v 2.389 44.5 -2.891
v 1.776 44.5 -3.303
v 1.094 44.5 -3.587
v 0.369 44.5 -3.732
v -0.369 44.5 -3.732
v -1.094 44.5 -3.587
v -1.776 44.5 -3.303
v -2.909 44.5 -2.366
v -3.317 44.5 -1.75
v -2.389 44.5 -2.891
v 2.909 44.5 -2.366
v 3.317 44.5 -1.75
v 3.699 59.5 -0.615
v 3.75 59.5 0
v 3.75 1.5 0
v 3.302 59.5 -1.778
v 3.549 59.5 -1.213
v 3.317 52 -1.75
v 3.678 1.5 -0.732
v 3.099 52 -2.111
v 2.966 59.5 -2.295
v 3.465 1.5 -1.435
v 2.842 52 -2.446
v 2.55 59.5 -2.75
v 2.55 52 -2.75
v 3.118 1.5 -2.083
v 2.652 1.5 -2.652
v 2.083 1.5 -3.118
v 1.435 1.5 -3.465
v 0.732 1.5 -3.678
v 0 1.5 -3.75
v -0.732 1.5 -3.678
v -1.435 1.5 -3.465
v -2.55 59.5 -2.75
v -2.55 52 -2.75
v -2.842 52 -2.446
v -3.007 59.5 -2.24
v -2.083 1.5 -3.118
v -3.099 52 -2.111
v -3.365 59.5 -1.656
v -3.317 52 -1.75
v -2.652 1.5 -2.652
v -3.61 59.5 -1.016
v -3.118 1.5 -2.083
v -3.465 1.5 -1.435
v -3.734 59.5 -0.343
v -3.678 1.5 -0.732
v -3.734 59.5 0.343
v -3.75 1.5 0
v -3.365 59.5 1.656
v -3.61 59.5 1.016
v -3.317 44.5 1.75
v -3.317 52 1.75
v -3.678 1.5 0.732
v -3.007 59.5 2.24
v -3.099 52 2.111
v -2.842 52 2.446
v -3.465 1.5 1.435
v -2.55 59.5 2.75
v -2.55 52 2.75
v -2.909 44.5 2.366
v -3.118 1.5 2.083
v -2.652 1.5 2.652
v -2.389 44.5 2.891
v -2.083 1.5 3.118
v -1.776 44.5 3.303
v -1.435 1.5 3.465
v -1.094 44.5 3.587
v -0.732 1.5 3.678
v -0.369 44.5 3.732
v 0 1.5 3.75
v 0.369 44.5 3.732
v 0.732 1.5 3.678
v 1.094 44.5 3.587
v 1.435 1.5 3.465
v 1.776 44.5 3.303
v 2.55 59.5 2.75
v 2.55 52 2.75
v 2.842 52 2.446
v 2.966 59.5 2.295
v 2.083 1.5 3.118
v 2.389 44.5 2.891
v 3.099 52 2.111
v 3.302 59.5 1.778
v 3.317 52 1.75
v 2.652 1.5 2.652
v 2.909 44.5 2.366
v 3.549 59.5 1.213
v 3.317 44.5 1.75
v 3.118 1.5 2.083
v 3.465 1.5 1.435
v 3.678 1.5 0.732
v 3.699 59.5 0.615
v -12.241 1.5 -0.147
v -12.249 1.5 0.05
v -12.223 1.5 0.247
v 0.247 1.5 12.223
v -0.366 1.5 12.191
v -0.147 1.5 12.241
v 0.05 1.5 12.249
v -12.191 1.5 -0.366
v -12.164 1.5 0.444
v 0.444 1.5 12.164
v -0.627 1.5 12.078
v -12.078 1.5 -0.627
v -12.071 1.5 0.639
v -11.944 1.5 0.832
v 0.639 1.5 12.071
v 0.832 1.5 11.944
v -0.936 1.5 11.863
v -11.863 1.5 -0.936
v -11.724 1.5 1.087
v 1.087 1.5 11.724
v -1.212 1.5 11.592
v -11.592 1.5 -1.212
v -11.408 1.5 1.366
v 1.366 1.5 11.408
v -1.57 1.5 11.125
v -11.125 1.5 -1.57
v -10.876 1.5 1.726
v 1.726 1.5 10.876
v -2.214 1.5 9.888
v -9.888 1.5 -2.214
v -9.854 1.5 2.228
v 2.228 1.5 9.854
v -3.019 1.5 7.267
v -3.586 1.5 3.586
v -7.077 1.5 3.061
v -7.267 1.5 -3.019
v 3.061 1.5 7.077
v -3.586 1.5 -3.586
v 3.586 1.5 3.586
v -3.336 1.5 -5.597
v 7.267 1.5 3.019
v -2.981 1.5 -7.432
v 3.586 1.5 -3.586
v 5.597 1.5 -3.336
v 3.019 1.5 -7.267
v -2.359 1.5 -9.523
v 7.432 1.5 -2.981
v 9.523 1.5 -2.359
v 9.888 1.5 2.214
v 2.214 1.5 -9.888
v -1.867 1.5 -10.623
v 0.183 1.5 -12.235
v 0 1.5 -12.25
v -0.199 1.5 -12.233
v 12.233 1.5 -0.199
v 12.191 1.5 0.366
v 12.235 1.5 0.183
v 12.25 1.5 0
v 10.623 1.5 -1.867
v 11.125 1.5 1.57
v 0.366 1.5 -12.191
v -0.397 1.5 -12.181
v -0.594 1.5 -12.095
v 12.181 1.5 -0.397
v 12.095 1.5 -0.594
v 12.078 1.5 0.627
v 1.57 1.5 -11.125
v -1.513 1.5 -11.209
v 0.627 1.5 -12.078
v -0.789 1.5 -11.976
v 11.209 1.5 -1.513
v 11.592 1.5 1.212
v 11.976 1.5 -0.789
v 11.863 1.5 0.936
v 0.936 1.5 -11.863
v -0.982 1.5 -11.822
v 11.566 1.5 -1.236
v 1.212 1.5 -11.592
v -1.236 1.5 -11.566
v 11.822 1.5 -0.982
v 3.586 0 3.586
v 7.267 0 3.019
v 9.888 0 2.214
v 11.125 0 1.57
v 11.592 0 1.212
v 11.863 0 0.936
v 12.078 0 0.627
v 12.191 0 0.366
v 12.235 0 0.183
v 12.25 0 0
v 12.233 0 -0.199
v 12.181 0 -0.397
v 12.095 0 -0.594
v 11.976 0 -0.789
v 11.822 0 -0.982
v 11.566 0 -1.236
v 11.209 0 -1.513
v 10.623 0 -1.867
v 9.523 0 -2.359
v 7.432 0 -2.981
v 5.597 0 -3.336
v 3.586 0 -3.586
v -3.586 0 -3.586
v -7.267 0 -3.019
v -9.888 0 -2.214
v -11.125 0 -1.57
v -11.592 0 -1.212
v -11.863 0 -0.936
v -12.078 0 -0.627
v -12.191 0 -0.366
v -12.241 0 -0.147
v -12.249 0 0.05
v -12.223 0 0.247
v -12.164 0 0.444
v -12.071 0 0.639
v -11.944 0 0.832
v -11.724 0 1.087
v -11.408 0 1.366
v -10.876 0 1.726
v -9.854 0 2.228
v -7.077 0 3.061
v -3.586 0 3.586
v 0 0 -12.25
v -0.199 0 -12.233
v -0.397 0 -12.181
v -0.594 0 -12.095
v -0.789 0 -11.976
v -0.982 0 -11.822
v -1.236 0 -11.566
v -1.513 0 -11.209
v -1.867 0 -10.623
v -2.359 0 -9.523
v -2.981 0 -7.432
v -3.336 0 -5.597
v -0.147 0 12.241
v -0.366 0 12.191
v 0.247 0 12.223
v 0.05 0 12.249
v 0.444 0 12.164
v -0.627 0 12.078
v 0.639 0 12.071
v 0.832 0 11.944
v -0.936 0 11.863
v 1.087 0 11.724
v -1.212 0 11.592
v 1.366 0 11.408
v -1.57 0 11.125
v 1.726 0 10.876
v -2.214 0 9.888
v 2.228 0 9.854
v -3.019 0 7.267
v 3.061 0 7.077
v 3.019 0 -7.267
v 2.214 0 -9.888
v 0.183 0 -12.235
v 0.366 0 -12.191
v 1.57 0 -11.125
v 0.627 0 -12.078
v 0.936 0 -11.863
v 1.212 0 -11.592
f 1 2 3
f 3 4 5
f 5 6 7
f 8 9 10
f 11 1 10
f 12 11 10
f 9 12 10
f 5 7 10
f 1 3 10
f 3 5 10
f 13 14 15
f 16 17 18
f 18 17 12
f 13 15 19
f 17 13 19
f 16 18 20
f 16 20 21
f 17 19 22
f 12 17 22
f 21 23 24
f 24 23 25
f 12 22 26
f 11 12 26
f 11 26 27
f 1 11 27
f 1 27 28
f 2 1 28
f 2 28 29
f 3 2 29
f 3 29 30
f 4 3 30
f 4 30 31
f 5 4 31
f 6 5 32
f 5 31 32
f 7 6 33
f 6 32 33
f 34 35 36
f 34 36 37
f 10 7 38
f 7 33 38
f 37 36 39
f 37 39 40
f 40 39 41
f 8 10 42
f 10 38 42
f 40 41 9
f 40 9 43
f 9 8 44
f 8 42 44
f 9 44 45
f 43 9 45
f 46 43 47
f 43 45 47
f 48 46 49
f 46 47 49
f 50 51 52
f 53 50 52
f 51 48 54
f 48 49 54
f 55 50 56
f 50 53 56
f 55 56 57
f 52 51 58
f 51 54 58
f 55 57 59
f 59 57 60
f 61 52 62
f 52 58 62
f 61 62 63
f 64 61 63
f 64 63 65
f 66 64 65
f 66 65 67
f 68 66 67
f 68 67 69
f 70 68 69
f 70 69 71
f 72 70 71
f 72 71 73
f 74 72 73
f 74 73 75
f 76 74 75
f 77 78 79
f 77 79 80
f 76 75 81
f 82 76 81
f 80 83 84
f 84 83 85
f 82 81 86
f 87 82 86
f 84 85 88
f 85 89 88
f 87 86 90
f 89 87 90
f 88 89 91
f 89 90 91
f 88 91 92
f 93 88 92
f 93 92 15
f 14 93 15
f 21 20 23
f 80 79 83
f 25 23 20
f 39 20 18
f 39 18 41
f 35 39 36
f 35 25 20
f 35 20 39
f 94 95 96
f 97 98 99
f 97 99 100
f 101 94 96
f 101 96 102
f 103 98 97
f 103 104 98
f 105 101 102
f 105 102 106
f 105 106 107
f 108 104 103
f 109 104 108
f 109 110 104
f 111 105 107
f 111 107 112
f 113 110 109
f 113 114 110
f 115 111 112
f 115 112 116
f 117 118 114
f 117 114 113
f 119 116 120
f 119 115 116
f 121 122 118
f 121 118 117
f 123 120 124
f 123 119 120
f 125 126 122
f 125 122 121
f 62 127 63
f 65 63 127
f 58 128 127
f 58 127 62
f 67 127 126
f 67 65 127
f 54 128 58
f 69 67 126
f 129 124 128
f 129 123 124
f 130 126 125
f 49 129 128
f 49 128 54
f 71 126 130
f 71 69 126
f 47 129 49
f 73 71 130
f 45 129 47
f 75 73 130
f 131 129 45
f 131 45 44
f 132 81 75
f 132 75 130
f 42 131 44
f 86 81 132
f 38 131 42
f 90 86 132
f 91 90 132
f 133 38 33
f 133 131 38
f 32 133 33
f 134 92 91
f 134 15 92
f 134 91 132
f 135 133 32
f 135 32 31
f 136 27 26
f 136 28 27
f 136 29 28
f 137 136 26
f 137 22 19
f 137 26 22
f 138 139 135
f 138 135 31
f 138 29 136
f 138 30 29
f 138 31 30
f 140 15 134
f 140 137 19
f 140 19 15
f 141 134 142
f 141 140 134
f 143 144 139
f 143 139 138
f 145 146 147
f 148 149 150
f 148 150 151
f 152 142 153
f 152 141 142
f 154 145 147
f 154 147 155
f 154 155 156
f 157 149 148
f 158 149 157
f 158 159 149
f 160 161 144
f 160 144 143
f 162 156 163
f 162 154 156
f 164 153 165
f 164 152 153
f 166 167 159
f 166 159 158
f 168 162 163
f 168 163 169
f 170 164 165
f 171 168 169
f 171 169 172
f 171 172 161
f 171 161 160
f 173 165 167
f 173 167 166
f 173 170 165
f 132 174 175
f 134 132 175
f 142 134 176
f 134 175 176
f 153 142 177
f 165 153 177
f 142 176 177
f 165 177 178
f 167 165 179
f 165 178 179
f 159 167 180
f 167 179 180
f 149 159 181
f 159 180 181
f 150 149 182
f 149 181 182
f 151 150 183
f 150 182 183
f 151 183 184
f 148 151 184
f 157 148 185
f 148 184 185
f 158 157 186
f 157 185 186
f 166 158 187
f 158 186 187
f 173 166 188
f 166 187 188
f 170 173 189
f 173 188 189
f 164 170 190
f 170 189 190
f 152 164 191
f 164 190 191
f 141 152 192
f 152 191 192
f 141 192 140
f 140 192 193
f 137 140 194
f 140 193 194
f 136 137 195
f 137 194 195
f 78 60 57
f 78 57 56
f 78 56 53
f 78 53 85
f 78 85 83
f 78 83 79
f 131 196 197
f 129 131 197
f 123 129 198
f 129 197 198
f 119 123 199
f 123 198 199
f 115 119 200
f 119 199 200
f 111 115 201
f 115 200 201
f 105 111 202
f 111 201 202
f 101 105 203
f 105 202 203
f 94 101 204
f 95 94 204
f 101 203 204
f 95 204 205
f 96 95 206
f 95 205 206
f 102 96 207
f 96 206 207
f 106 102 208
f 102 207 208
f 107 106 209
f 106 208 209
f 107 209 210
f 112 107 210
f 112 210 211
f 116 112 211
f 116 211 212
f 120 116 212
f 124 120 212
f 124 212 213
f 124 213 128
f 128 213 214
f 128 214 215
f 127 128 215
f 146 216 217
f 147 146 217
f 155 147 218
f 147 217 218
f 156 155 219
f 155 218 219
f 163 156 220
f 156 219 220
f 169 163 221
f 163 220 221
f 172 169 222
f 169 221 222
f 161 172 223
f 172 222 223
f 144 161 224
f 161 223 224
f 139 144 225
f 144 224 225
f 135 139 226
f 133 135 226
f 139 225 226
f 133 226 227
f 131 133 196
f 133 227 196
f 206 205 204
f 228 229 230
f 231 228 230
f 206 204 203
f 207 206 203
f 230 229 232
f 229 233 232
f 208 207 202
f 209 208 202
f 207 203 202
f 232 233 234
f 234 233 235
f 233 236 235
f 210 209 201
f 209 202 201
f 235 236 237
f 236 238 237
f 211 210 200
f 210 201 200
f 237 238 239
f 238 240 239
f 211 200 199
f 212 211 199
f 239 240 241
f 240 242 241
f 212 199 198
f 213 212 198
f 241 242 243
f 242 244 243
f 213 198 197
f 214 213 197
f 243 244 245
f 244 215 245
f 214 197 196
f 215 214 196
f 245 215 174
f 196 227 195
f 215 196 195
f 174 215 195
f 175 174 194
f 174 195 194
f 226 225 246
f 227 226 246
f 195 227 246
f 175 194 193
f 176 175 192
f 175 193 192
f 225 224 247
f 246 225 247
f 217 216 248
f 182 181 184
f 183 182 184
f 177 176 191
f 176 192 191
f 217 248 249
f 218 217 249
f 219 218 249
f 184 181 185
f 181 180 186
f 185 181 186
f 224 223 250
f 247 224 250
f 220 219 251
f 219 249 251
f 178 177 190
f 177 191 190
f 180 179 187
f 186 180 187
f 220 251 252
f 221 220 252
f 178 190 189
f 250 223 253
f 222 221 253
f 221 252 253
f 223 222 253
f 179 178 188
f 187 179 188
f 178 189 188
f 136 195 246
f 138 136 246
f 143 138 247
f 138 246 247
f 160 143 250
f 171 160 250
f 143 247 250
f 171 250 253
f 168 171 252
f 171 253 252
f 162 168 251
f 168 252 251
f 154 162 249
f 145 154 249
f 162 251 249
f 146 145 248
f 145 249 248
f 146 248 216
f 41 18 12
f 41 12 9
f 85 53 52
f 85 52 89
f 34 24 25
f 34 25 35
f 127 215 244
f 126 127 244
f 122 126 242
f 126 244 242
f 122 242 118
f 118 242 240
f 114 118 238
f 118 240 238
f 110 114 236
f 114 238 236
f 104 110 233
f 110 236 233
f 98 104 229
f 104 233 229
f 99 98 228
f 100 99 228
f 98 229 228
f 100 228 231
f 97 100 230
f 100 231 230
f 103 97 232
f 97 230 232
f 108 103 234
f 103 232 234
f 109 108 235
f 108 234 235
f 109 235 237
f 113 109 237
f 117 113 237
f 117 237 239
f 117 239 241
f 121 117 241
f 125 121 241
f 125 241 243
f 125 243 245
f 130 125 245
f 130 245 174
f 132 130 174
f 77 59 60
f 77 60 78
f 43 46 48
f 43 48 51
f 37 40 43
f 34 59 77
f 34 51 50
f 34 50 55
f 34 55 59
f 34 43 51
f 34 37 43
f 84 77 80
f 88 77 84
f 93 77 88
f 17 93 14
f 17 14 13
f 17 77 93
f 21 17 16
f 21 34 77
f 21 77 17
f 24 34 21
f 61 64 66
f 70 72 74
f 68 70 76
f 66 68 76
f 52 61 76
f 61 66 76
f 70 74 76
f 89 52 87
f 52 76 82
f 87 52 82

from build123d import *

# Parameters (mm, degrees)
SKETCH1_RX          = 12.25
SKETCH1_RY          = 3.75
BOSS_EXTRUDE1_DEPTH = 1.5
SKETCH2_R           = 3.75
BOSS_EXTRUDE2_DEPTH = 58
SKETCH3_W           = 7.5
SKETCH3_H           = 15
CUT_EXTRUDE1_DEPTH  = 1
SKETCH4_W           = 12.491636394
SKETCH4_H           = 7.5
CUT_EXTRUDE2_DEPTH  = 1
CIRPATTERN1_COUNT   = 2


with BuildPart() as part:
    # Sketch1 → Boss-Extrude1 (new body)
    with BuildSketch(Plane(origin=(0, 0, 0), x_dir=(1, 0, 0), z_dir=(0, 1, 0))):
        with Locations((0, 0)):
            Ellipse(SKETCH1_RX, SKETCH1_RY)
        with Locations(Location((0, 0), (0, 0, 90))):
            Ellipse(SKETCH1_RX, SKETCH1_RY)
    extrude(amount=BOSS_EXTRUDE1_DEPTH)

    # Sketch2 → Boss-Extrude2 (add)
    with BuildSketch(Plane(origin=(0, 1.5, 0), x_dir=(1, 0, 0), z_dir=(0, 1, 0))):
        Circle(SKETCH2_R)
    extrude(amount=BOSS_EXTRUDE2_DEPTH)

    # Sketch3 → Cut-Extrude1 (cut)
    with BuildSketch(Plane.XY.offset(3.75)):
        with Locations((0, 52)):
            Rectangle(SKETCH3_W, SKETCH3_H)
    cut_extrude1 = extrude(amount=-CUT_EXTRUDE1_DEPTH, mode=Mode.SUBTRACT)

    # Sketch4 → Cut-Extrude2 (cut)
    with BuildSketch(Plane.XY.offset(2.75)):
        with Locations((0.147803462, 48.25)):
            Rectangle(SKETCH4_W, SKETCH4_H)
    cut_extrude2 = extrude(amount=-CUT_EXTRUDE2_DEPTH, mode=Mode.SUBTRACT)

    # CirPattern1: Cut-Extrude1, Cut-Extrude2 ×2 about axis
    cirpattern1_axis = Axis((0, 59.5, 0), (0, 1, 0))
    for i in range(1, CIRPATTERN1_COUNT):
        add(cut_extrude1.rotate(cirpattern1_axis, i * 360 / CIRPATTERN1_COUNT), mode=Mode.SUBTRACT)
        add(cut_extrude2.rotate(cirpattern1_axis, i * 360 / CIRPATTERN1_COUNT), mode=Mode.SUBTRACT)


solid = part.part
